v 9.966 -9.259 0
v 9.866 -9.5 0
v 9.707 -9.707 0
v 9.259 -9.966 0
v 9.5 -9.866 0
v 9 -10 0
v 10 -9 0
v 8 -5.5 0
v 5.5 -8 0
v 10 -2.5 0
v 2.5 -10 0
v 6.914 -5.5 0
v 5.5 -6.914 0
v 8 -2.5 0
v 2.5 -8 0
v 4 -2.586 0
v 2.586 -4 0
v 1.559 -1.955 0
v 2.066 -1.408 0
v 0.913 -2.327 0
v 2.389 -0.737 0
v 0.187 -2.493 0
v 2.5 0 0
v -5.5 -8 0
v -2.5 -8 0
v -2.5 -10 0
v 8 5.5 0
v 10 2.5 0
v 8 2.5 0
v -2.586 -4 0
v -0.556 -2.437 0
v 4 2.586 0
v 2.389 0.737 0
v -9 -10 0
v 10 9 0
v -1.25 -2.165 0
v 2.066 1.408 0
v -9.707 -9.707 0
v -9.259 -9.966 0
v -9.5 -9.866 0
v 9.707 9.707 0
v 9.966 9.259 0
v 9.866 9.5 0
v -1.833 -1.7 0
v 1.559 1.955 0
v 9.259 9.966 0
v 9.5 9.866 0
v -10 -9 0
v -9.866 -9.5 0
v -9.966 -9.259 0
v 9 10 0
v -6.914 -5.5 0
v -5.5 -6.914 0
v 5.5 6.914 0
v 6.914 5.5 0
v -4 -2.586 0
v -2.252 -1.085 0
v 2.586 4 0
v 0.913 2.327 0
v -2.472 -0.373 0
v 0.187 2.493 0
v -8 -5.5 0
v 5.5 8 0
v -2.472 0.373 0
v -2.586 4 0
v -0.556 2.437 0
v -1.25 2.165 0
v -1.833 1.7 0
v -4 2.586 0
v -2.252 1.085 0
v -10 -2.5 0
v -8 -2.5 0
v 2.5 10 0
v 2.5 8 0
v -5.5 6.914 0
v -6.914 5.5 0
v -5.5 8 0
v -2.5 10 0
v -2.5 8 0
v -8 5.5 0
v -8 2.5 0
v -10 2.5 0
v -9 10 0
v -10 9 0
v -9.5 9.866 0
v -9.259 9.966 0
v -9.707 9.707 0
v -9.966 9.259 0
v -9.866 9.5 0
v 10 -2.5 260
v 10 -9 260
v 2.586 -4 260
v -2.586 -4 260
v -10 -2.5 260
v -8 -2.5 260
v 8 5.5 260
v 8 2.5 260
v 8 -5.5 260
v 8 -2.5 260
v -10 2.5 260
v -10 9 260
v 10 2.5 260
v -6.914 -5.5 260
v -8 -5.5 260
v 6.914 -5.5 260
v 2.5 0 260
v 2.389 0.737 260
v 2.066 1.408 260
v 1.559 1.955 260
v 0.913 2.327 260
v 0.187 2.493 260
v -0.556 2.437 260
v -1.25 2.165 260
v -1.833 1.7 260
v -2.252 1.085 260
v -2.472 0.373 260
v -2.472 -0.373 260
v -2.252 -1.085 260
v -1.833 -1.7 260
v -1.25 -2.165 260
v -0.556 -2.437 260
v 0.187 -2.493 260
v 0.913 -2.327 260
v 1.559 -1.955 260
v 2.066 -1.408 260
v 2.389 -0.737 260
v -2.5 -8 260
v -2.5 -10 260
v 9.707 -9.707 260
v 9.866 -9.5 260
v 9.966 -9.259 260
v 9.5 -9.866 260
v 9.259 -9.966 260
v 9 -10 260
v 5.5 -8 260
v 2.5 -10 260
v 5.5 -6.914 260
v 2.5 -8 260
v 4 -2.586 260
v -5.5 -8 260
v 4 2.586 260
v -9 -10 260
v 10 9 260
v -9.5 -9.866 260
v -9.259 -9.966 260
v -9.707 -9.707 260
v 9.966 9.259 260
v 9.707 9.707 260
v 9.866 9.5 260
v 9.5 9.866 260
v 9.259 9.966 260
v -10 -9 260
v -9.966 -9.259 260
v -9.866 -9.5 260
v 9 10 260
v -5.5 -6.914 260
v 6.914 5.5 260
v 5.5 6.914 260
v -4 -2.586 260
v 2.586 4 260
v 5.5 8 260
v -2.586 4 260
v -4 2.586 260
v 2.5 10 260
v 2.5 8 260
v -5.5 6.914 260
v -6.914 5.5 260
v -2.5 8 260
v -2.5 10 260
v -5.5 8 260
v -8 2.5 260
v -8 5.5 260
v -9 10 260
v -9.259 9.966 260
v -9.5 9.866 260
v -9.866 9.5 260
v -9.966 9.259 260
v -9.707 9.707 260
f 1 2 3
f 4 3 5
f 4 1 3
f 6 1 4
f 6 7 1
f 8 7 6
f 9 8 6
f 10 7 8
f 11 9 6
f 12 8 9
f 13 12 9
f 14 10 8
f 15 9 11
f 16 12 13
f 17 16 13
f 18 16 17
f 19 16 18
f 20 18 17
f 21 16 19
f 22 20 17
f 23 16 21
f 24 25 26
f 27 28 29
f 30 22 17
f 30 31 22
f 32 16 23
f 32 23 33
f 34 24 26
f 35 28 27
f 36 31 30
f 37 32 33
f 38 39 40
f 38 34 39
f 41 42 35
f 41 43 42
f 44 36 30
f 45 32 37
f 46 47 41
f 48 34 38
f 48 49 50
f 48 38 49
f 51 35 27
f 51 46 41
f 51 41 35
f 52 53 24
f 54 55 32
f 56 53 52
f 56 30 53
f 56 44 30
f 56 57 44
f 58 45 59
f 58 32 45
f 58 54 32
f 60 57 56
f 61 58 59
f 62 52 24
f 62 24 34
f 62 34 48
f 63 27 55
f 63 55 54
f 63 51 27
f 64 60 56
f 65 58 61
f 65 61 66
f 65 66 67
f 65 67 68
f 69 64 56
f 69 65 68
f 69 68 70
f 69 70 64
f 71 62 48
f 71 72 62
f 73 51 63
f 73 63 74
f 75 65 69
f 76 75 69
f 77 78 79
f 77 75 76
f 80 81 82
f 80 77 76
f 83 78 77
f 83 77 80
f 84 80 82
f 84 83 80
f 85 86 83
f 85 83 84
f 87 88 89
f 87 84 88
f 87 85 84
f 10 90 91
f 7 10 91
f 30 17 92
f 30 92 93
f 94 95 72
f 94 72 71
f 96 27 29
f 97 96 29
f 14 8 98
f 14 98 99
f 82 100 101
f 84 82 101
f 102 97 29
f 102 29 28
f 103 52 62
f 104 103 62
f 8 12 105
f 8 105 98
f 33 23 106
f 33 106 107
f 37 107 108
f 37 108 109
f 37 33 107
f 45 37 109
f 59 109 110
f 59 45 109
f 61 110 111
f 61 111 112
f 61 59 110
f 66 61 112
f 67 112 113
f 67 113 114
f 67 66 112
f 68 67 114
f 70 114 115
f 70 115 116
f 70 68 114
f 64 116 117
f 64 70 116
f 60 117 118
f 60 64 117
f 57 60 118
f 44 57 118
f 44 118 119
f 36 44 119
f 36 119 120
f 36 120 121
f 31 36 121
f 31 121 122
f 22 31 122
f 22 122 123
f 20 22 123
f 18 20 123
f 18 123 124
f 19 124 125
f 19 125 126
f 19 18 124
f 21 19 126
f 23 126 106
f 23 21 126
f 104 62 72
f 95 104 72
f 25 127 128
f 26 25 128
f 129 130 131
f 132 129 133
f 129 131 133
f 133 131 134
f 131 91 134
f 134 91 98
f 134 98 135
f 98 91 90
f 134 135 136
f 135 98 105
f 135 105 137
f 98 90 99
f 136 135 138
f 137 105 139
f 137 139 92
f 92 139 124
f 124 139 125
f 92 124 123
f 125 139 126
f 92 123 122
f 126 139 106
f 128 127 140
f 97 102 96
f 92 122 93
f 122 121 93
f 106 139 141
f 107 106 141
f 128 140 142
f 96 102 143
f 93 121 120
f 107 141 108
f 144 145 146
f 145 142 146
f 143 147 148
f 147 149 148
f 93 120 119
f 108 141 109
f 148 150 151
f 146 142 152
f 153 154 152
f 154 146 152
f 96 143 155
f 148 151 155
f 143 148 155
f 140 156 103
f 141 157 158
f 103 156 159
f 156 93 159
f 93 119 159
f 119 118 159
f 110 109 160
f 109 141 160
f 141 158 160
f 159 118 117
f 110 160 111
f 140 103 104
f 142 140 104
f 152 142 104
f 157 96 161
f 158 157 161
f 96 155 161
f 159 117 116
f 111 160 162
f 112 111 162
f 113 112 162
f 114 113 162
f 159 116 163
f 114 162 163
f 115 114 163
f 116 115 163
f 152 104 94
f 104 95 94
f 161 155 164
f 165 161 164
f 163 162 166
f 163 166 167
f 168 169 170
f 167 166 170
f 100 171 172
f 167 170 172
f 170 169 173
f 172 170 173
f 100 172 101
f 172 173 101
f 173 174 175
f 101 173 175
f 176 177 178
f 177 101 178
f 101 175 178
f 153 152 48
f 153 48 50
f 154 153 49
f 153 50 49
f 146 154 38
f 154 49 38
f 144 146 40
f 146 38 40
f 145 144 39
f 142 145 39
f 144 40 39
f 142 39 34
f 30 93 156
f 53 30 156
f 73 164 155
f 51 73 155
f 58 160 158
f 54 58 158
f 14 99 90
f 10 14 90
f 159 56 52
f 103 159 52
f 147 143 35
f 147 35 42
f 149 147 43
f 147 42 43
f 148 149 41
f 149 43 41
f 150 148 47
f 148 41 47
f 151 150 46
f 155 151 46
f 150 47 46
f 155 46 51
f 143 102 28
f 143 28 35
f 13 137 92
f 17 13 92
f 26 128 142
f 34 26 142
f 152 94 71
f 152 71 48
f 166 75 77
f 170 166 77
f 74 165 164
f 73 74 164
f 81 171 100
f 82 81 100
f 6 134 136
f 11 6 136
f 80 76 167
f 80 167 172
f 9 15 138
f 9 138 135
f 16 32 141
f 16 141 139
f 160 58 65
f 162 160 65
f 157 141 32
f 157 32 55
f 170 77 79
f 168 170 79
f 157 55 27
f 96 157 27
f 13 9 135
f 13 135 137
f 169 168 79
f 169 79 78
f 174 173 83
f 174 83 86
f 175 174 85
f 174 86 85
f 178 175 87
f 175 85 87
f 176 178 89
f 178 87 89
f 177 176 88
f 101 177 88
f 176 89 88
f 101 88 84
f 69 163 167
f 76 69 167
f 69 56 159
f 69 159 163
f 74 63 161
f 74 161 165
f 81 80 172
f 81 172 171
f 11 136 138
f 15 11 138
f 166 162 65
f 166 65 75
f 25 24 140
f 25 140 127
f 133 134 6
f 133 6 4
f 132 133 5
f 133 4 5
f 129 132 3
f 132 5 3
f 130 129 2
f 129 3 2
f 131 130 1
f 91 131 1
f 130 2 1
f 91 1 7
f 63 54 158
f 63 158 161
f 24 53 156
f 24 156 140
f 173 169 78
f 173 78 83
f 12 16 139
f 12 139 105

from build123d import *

# Parameters (mm, degrees)
SKETCH005_R  = 2.5
PAD003_DEPTH = 260


with BuildPart() as part:
    # Sketch005 → Pad003 (new body)
    with BuildSketch(Plane.XY):
        with BuildLine():
            Line((-4, -2.585786), (-4, 2.585787))
            Line((-4, 2.585787), (-6.914214, 5.500001))
            Line((-6.914214, 5.500001), (-8, 5.500001))
            Line((-8, 5.500001), (-8, 2.500001))
            Line((-8, 2.500001), (-10, 2.500001))
            Line((-10, 2.500001), (-10, 9.000001))
            ThreePointArc((-9, 10), (-9.707107, 9.707107), (-10, 9.000001))
            Line((-2.5, 10), (-9, 10))
            Line((-2.5, 8), (-2.5, 10))
            Line((-5.5, 8), (-2.5, 8))
            Line((-5.5, 6.914214), (-5.5, 8))
            Line((-2.585786, 4), (-5.5, 6.914214))
            Line((2.585786, 4), (-2.585786, 4))
            Line((2.585786, 4), (5.5, 6.914214))
            Line((5.5, 6.914214), (5.5, 8))
            Line((5.5, 8), (2.5, 8))
            Line((2.5, 8), (2.5, 10))
            Line((2.5, 10), (9, 10))
            ThreePointArc((10, 9.000001), (9.707107, 9.707107), (9, 10))
            Line((10, 2.500001), (10, 9.000001))
            Line((8, 2.500001), (10, 2.500001))
            Line((8, 5.500001), (8, 2.500001))
            Line((6.914214, 5.500001), (8, 5.500001))
            Line((4, 2.585787), (6.914214, 5.500001))
            Line((4, 2.585787), (4, -2.585786))
            Line((4, -2.585786), (6.914214, -5.500001))
            Line((6.914214, -5.500001), (8, -5.500001))
            Line((8, -5.500001), (8, -2.500001))
            Line((8, -2.500001), (10, -2.500001))
            Line((10, -2.500001), (10, -9.000001))
            ThreePointArc((9, -10), (9.707107, -9.707107), (10, -9.000001))
            Line((9, -10), (2.5, -10))
            Line((2.5, -10), (2.5, -8))
            Line((2.5, -8), (5.5, -8))
            Line((5.5, -8), (5.5, -6.914214))
            Line((5.5, -6.914214), (2.585786, -4))
            Line((2.585786, -4), (-2.585786, -4))
            Line((-2.585786, -4), (-5.5, -6.914214))
            Line((-5.5, -6.914214), (-5.5, -8))
            Line((-5.5, -8), (-2.5, -8))
            Line((-2.5, -8), (-2.5, -10))
            Line((-2.5, -10), (-9, -10))
            ThreePointArc((-10, -9.000001), (-9.707107, -9.707107), (-9, -10))
            Line((-10, -2.500001), (-10, -9.000001))
            Line((-8, -2.500001), (-10, -2.500001))
            Line((-8, -5.500001), (-8, -2.500001))
            Line((-6.914214, -5.500001), (-8, -5.500001))
            Line((-4, -2.585786), (-6.914214, -5.500001))
        make_face()
        Circle(SKETCH005_R, mode=Mode.SUBTRACT)
    extrude(amount=PAD003_DEPTH)


solid = part.part
